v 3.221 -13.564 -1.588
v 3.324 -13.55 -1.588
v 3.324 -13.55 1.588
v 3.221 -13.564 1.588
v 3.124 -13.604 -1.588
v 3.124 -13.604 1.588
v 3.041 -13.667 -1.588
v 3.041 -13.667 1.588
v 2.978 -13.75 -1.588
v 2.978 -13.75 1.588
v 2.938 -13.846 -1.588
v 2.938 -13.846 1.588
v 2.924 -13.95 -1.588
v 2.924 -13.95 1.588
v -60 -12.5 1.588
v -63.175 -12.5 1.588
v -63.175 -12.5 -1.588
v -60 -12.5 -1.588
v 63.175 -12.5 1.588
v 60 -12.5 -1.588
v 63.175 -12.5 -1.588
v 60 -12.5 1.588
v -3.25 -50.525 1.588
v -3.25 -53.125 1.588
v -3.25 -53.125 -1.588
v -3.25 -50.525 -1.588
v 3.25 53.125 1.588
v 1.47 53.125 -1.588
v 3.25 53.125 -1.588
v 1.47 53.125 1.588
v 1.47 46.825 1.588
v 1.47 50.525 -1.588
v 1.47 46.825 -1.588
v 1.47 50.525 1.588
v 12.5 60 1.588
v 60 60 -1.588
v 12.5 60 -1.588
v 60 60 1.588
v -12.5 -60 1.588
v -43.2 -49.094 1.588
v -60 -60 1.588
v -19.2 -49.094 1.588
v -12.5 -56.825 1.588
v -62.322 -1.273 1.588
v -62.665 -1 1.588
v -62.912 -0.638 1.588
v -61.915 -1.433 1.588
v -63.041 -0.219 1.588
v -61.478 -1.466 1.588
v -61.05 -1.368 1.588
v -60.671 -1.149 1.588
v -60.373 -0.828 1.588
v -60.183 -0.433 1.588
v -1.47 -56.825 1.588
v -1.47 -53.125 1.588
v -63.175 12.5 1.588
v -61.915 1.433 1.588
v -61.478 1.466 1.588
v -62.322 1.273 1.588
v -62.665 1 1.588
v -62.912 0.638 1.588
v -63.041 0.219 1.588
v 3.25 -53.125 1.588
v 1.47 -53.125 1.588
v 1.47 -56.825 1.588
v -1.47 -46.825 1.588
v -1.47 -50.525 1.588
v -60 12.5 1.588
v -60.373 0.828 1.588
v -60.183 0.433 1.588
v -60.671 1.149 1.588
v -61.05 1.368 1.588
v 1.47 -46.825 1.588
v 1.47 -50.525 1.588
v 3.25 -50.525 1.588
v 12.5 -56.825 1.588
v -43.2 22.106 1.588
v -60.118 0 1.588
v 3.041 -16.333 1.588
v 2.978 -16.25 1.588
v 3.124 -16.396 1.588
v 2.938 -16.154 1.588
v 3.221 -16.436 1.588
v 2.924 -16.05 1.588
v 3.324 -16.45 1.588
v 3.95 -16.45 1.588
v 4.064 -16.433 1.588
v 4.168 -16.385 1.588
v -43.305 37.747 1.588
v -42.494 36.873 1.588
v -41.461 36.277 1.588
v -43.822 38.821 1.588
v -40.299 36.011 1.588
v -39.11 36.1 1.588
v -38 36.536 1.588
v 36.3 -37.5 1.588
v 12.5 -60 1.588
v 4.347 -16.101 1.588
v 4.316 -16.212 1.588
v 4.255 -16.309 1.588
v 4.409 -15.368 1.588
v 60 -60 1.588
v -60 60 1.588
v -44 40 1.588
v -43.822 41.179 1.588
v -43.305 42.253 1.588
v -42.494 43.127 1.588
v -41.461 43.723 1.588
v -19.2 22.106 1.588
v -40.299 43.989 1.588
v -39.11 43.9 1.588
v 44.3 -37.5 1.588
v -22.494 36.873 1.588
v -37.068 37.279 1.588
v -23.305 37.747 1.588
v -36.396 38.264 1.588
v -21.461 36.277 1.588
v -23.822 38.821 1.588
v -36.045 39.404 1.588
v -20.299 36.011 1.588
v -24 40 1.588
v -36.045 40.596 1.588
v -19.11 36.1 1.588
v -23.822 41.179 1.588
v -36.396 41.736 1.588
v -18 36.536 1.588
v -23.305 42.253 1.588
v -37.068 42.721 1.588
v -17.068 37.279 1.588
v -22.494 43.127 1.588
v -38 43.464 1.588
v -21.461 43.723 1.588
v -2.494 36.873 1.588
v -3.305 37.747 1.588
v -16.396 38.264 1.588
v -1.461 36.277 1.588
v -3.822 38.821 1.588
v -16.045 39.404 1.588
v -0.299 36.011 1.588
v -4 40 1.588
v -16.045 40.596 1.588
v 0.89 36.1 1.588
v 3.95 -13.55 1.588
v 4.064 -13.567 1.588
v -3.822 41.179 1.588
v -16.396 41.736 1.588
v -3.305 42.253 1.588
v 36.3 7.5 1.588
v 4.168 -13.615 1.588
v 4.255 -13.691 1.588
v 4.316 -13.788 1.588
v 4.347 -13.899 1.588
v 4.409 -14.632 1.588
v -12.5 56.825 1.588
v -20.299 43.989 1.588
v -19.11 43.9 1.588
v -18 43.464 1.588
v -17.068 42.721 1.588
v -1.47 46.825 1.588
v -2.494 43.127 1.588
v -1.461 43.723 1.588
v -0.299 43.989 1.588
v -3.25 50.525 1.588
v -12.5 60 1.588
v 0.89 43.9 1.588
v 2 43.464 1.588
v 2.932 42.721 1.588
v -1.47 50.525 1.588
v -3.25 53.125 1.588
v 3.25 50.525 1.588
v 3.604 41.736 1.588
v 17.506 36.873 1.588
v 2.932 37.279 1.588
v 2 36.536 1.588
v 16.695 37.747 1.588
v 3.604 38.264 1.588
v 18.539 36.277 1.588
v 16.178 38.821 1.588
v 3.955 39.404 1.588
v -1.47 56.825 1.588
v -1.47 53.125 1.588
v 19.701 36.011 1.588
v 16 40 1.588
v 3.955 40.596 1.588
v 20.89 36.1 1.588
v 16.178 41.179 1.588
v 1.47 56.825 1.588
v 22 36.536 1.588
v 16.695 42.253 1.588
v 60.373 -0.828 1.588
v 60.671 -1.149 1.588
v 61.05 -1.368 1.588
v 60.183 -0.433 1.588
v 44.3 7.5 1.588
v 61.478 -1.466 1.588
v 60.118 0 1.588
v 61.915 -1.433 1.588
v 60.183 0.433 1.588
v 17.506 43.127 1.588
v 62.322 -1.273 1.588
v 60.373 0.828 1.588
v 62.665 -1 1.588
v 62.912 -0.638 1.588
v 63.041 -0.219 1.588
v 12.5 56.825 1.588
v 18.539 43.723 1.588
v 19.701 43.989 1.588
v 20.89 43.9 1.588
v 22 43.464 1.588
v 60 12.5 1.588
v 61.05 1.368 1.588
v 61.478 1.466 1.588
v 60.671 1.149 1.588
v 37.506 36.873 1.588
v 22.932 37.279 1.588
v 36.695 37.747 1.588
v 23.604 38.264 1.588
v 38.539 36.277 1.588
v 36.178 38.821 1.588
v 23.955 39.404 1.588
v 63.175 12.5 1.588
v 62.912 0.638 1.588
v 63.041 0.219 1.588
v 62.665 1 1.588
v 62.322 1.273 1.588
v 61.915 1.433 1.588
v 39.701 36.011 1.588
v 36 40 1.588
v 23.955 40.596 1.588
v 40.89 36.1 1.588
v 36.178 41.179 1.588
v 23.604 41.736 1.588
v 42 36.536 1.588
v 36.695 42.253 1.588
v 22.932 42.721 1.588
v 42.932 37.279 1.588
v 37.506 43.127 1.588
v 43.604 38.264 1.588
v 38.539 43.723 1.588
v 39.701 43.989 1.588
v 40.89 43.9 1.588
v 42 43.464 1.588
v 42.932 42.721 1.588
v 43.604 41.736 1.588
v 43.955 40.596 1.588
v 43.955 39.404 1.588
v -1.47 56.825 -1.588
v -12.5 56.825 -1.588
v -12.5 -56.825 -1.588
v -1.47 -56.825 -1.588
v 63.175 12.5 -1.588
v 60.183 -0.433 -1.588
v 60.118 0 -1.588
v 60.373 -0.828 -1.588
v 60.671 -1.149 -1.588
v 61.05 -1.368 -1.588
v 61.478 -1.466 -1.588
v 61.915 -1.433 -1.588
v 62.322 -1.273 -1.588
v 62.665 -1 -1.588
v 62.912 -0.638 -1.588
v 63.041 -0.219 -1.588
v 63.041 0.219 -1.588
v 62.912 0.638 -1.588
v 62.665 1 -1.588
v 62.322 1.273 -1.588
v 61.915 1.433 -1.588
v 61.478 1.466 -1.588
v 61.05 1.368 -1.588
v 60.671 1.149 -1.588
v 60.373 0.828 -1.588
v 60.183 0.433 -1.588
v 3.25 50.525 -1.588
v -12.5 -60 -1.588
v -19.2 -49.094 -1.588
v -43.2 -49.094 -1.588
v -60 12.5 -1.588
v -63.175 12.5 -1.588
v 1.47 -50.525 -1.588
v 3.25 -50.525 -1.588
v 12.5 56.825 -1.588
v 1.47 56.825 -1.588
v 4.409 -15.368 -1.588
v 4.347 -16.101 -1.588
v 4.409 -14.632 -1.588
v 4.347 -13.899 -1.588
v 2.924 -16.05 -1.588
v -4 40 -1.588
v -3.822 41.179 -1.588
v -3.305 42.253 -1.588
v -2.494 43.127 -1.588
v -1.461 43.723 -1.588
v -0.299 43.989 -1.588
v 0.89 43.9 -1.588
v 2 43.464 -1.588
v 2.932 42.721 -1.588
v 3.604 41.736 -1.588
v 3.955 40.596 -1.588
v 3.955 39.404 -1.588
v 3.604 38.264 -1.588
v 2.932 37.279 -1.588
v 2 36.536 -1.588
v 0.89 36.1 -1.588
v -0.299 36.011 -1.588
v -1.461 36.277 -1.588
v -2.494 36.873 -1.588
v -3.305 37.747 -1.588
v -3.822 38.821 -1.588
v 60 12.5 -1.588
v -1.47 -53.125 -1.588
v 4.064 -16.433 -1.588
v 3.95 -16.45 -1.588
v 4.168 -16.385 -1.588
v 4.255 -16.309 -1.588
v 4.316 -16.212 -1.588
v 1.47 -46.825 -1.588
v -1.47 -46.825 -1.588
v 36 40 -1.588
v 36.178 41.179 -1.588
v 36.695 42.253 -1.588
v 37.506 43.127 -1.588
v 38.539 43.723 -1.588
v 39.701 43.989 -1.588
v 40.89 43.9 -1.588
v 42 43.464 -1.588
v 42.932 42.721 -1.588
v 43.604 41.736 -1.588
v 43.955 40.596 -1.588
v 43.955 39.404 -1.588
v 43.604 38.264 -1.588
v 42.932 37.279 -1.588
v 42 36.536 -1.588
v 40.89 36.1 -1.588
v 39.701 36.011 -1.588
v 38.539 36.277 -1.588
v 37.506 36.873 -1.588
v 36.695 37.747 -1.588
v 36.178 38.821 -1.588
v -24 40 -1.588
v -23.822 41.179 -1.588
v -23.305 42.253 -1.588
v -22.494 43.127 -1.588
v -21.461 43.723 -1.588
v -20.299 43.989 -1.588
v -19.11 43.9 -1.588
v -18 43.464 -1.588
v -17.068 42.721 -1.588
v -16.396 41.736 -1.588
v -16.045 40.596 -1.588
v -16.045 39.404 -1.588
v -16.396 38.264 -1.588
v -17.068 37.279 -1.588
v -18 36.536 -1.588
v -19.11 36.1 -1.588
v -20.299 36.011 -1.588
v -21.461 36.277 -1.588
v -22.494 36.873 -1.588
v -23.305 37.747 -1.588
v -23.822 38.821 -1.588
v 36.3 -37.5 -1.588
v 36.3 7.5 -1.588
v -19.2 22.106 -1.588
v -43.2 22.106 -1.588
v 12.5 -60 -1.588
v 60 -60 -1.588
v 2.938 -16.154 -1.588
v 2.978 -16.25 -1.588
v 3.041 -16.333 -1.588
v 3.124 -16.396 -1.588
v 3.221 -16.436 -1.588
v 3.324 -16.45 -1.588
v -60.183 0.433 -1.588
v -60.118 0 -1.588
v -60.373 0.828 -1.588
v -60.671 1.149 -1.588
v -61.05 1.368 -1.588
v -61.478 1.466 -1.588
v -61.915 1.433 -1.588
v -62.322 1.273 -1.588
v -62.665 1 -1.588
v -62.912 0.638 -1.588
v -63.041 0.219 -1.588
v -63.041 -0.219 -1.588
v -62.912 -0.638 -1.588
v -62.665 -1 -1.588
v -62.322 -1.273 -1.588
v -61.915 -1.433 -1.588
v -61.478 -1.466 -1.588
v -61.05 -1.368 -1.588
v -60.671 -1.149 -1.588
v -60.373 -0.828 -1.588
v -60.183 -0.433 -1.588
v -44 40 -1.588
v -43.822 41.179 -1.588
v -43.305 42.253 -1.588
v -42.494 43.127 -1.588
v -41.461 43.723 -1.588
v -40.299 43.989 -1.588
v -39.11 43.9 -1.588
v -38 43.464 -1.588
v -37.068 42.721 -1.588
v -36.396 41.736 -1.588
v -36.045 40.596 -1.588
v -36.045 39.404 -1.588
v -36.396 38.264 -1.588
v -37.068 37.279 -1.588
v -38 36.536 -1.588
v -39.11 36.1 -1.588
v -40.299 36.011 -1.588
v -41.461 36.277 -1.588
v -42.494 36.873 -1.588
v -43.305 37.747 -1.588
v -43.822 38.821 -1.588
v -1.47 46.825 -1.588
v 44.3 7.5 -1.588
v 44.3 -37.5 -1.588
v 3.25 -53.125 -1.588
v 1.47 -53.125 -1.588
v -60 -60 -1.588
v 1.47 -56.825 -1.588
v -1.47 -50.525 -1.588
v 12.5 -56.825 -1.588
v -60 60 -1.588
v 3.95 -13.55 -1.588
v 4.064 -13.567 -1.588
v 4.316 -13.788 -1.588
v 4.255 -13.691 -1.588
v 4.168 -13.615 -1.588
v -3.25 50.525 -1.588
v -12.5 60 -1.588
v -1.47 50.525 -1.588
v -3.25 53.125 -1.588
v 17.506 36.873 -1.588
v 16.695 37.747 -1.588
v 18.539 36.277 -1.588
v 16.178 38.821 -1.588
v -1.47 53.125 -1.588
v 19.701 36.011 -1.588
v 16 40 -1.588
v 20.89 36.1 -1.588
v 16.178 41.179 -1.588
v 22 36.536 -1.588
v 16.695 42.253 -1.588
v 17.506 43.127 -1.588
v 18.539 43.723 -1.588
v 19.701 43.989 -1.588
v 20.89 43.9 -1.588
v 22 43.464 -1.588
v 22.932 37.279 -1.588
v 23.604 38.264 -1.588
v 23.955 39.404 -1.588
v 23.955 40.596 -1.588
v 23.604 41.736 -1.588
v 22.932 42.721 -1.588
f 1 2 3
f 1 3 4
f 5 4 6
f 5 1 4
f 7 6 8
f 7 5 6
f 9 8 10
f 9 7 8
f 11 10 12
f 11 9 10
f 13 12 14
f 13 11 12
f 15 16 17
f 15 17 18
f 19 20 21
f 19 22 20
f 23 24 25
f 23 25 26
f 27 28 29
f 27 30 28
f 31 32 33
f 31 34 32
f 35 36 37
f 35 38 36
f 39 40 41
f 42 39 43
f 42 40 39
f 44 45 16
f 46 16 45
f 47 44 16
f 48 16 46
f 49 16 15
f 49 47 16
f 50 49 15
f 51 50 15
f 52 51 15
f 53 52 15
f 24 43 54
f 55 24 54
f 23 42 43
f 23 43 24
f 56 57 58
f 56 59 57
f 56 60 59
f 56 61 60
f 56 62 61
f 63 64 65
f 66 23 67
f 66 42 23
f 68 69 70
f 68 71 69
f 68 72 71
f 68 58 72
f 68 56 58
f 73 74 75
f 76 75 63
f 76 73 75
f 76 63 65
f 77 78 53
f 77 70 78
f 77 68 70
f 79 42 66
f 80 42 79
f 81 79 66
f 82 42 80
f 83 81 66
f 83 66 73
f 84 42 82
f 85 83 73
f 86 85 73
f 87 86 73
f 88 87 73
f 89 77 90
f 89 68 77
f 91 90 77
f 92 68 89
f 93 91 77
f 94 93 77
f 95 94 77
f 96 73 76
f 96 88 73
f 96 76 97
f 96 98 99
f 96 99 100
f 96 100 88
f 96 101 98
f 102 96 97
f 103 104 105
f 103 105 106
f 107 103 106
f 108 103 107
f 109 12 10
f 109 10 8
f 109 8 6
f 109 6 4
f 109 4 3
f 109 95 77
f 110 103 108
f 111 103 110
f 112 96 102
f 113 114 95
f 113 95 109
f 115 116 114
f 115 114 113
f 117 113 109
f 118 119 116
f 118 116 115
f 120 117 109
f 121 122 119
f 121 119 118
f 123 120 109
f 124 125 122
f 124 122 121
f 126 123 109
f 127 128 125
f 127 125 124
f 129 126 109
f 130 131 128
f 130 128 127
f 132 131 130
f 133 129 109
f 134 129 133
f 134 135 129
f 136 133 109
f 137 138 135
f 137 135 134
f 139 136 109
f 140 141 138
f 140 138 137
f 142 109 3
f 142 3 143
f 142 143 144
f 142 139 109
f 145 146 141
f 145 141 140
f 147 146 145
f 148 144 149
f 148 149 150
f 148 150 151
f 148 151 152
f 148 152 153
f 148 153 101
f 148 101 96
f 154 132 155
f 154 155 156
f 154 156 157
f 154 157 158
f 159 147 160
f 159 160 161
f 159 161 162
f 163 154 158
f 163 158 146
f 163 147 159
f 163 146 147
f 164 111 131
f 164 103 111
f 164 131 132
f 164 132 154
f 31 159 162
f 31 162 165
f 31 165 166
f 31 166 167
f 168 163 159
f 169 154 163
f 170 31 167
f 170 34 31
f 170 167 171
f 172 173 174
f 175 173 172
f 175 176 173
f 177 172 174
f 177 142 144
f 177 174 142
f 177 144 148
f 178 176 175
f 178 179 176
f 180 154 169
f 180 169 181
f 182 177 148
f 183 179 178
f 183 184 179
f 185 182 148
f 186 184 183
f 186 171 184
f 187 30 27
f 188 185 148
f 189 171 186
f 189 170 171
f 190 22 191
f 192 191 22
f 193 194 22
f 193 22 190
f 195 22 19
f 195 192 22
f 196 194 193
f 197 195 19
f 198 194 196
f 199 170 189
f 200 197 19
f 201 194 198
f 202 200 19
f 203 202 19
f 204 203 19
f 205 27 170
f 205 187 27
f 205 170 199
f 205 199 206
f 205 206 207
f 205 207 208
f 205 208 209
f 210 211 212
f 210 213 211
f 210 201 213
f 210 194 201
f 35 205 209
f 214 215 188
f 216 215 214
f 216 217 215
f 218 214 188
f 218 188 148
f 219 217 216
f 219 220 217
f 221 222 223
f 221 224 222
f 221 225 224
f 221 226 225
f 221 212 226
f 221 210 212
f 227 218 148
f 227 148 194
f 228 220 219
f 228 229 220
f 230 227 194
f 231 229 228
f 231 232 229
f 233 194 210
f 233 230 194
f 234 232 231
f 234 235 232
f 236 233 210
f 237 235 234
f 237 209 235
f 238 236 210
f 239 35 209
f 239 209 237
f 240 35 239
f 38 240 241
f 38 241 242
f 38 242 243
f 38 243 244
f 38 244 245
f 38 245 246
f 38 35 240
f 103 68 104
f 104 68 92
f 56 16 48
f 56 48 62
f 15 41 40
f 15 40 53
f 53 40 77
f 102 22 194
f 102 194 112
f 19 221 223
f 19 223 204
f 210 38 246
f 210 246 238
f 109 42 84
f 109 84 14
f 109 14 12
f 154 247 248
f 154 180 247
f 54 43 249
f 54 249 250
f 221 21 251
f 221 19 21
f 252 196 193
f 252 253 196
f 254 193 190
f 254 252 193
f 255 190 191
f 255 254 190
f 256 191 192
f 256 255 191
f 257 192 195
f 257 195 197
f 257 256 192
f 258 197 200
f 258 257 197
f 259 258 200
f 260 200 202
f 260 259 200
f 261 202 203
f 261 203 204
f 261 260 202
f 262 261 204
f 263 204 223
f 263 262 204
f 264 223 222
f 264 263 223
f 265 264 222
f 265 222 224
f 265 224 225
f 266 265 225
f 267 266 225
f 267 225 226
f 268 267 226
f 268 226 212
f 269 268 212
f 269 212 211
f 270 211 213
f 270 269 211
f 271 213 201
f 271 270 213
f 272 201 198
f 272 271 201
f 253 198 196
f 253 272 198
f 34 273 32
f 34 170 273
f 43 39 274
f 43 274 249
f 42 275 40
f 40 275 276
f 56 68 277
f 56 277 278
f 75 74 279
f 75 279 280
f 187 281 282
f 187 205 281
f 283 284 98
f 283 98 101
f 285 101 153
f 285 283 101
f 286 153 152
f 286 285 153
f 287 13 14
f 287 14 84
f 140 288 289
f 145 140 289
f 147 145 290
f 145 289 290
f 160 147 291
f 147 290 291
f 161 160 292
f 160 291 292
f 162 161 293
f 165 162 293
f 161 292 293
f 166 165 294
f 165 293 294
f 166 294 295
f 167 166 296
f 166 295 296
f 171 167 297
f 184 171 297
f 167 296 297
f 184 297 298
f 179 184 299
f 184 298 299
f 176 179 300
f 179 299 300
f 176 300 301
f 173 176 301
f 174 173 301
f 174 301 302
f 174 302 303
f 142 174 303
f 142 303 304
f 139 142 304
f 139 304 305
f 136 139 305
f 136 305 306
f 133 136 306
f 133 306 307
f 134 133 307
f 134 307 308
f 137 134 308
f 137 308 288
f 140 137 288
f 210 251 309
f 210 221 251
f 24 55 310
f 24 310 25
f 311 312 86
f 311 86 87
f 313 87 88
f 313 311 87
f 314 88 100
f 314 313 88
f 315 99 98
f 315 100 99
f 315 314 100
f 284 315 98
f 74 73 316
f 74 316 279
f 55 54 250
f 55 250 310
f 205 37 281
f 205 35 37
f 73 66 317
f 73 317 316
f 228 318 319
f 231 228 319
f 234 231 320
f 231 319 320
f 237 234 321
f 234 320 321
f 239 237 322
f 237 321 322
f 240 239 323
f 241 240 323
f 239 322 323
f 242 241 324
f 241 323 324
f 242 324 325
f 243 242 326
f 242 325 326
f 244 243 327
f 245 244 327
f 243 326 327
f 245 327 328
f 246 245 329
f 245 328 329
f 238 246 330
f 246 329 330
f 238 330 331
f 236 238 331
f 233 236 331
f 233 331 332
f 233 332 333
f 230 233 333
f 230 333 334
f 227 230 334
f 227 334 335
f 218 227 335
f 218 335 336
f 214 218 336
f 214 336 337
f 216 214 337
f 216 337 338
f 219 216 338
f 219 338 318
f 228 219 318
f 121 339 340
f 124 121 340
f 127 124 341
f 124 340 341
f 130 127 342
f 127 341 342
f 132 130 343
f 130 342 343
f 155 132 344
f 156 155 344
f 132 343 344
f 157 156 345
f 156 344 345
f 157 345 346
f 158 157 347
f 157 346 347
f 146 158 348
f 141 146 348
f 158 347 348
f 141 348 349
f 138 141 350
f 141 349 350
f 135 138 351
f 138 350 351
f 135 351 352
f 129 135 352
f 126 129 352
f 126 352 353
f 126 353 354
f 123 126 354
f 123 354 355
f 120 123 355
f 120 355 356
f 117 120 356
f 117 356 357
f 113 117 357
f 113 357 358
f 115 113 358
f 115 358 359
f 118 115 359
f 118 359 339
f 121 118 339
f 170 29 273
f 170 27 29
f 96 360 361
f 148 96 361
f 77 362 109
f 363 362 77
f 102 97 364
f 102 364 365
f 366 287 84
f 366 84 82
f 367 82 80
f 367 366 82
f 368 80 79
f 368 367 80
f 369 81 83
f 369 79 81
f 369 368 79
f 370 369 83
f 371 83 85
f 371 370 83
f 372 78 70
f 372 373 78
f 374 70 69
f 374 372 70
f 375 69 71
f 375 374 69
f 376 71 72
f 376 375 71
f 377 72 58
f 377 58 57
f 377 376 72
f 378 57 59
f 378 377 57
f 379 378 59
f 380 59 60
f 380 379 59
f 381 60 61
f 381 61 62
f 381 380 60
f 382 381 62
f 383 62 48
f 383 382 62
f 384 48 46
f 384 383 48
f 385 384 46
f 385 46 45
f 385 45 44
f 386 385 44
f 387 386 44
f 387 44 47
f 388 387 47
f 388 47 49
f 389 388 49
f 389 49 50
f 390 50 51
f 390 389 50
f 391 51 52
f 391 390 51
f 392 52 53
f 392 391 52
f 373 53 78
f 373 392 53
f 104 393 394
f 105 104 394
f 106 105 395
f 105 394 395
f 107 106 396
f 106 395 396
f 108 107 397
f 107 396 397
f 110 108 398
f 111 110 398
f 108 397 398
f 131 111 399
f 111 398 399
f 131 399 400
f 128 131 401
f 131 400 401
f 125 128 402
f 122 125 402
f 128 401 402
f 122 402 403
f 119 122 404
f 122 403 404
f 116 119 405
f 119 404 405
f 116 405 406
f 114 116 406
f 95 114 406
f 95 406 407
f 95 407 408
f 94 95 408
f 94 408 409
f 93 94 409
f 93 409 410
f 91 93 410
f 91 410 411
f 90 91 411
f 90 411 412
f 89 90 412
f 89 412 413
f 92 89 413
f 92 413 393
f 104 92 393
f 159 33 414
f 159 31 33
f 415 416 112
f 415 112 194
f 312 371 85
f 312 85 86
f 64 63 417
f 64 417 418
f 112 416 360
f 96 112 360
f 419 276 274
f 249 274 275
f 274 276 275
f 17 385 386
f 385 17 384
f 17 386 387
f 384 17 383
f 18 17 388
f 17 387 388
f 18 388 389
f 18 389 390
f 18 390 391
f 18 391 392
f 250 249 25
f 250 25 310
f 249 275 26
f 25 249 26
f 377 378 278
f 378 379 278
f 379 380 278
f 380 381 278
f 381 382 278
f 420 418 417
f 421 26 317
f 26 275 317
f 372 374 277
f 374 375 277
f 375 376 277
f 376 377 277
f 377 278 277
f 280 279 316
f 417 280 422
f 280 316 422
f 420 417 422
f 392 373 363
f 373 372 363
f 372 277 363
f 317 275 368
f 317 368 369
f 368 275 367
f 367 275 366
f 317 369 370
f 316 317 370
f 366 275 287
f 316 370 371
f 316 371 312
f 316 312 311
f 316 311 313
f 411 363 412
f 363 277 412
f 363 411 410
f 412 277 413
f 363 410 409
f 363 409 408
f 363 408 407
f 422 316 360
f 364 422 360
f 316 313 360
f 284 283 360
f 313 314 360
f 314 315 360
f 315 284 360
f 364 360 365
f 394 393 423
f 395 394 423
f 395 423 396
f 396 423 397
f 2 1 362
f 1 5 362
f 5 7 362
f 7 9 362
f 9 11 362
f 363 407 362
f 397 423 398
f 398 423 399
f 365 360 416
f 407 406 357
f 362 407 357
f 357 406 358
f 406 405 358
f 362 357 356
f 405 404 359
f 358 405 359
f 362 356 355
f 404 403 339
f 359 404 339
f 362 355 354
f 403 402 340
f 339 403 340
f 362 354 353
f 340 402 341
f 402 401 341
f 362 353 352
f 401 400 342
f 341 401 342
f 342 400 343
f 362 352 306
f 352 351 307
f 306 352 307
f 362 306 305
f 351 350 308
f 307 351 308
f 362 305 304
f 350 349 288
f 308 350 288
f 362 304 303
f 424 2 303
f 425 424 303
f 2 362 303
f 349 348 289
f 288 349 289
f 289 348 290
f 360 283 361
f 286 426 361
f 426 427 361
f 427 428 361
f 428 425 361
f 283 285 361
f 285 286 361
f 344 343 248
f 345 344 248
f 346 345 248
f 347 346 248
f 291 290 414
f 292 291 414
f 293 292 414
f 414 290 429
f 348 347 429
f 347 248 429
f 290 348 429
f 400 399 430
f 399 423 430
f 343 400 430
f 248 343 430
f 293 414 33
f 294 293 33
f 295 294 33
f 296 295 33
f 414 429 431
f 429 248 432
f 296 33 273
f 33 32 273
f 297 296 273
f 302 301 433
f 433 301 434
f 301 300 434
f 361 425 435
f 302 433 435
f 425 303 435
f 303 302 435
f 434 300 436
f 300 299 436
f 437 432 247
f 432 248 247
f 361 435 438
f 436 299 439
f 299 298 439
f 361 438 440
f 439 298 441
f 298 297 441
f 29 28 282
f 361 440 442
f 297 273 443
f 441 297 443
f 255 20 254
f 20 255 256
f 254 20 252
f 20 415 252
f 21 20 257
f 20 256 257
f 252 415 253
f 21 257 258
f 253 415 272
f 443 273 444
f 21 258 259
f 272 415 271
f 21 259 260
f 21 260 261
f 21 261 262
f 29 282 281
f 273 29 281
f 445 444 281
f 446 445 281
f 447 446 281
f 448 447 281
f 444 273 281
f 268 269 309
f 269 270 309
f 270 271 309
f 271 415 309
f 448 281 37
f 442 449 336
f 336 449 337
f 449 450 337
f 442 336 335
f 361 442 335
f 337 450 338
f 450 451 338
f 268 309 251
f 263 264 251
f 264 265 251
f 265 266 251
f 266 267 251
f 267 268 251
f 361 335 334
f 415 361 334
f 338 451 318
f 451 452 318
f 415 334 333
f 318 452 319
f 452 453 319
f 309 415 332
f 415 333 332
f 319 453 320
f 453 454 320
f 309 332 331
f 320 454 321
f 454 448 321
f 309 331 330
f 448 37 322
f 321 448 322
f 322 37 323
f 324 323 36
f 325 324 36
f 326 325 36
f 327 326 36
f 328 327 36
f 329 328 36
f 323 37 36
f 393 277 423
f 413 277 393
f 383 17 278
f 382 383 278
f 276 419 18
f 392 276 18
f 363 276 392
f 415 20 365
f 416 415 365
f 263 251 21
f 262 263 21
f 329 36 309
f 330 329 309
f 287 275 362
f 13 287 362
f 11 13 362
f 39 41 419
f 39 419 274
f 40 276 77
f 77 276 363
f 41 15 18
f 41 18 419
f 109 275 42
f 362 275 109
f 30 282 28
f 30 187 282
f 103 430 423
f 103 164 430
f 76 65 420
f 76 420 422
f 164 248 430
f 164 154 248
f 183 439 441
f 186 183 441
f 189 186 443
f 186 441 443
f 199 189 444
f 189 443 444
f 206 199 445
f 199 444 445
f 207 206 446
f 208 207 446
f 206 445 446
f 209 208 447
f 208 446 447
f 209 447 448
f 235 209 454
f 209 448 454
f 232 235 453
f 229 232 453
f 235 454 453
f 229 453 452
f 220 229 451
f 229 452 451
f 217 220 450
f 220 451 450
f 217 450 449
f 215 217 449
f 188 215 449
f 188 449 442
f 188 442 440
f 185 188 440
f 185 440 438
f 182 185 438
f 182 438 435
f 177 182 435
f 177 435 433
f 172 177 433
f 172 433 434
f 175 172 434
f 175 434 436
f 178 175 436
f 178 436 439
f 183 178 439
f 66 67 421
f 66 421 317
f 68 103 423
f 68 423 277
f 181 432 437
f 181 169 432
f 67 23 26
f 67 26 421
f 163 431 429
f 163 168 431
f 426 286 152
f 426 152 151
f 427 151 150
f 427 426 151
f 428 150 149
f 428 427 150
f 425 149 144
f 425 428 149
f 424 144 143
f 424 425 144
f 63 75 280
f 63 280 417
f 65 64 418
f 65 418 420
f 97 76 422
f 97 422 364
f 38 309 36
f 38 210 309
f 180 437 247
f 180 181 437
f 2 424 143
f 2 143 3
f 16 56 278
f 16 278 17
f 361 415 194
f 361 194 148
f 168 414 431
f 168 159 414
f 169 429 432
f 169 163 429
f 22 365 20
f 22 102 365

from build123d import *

# Parameters (mm, degrees)
SKETCH1_R           = 1.47
BOSS_EXTRUDE1_DEPTH = 1.5875
SKETCH3_W           = 8
SKETCH3_H           = 45
CUT_EXTRUDE1_DEPTH  = 88.184638842
SKETCH4_W           = 24
SKETCH4_H           = 71.2
CUT_EXTRUDE2_DEPTH  = 88.184638842
CUT_EXTRUDE4_DEPTH  = 88.184638842
SKETCH6_R           = 4
CUT_EXTRUDE5_DEPTH  = 88.184638842


with BuildPart() as part:
    # Sketch1 → Boss-Extrude1 (new, symmetric)
    with BuildSketch(Plane.XY):
        Polygon((-12.5, 60), (-60, 60), (-60, 12.5), (-63.175, 12.5), (-63.175, -12.5), (-60, -12.5), (-60, -60), (-12.5, -60), (-12.5, -56.825), (-1.47, -56.825), (-1.47, -53.125), (-3.25, -53.125), (-3.25, -50.525), (-1.47, -50.525), (-1.47, -46.825), (1.47, -46.825), (1.47, -50.525), (3.25, -50.525), (3.25, -53.125), (1.47, -53.125), (1.47, -56.825), (12.5, -56.825), (12.5, -60), (60, -60), (60, -12.5), (63.175, -12.5), (63.175, 12.5), (60, 12.5), (60, 60), (12.5, 60), (12.5, 56.825), (1.47, 56.825), (1.47, 53.125), (3.25, 53.125), (3.25, 50.525), (1.47, 50.525), (1.47, 46.825), (-1.47, 46.825), (-1.47, 50.525), (-3.25, 50.525), (-3.25, 53.125), (-1.47, 53.125), (-1.47, 56.825), (-12.5, 56.825), align=None)
        with Locations((-61.5875, 0)):
            Circle(SKETCH1_R, mode=Mode.SUBTRACT)
        with Locations(Location((61.5875, 0, 0), (0, 0, 180))):
            Circle(SKETCH1_R, mode=Mode.SUBTRACT)
    extrude(amount=BOSS_EXTRUDE1_DEPTH, both=True)

    # Sketch3 → Cut-Extrude1 (cut, through all)
    with BuildSketch(Plane(origin=(0, 0, -1.5875), x_dir=(-1, 0, 0), z_dir=(0, 0, -1))):
        with Locations((-40.3, -15)):
            Rectangle(SKETCH3_W, SKETCH3_H)
    extrude(amount=-CUT_EXTRUDE1_DEPTH, mode=Mode.SUBTRACT)

    # Sketch4 → Cut-Extrude2 (cut, through all)
    with BuildSketch(Plane(origin=(0, 0, -1.5875), x_dir=(-1, 0, 0), z_dir=(0, 0, -1))):
        with Locations((31.2, -13.494459363)):
            Rectangle(SKETCH4_W, SKETCH4_H)
    extrude(amount=-CUT_EXTRUDE2_DEPTH, mode=Mode.SUBTRACT)

    # Sketch5 → Cut-Extrude4 (cut, through all)
    with BuildSketch(Plane(origin=(0, 0, -1.5875), x_dir=(-1, 0, 0), z_dir=(0, 0, -1))):
        with BuildLine():
            Line((-3.324117887, -16.45), (-3.949848491, -16.45))
            ThreePointArc((-3.949848491, -16.45), (-4.214195834, -16.350200736), (-4.346634826, -16.10060241))
            ThreePointArc((-4.346634826, -16.10060241), (-4.416532026, -15), (-4.346634826, -13.89939759))
            ThreePointArc((-4.346634826, -13.89939759), (-4.214195834, -13.649799264), (-3.949848491, -13.55))
            Line((-3.949848491, -13.55), (-3.324117887, -13.55))
            ThreePointArc((-3.324117887, -13.55), (-3.041275174, -13.667157288), (-2.924117887, -13.95))
            Line((-2.924117887, -13.95), (-2.924117887, -16.05))
            ThreePointArc((-2.924117887, -16.05), (-3.041275174, -16.332842712), (-3.324117887, -16.45))
        make_face()
    extrude(amount=-CUT_EXTRUDE4_DEPTH, mode=Mode.SUBTRACT)

    # Sketch6 → Cut-Extrude5 (cut, through all)
    with BuildSketch(Plane(origin=(0, 0, -1.5875), x_dir=(-1, 0, 0), z_dir=(0, 0, -1))):
        with Locations((40, 40)):
            Circle(SKETCH6_R)
        with Locations((20, 40)):
            Circle(SKETCH6_R)
        with Locations((0, 40)):
            Circle(SKETCH6_R)
        with Locations((-20, 40)):
            Circle(SKETCH6_R)
        with Locations((-40, 40)):
            Circle(SKETCH6_R)
    extrude(amount=-CUT_EXTRUDE5_DEPTH, mode=Mode.SUBTRACT)


solid = part.part
